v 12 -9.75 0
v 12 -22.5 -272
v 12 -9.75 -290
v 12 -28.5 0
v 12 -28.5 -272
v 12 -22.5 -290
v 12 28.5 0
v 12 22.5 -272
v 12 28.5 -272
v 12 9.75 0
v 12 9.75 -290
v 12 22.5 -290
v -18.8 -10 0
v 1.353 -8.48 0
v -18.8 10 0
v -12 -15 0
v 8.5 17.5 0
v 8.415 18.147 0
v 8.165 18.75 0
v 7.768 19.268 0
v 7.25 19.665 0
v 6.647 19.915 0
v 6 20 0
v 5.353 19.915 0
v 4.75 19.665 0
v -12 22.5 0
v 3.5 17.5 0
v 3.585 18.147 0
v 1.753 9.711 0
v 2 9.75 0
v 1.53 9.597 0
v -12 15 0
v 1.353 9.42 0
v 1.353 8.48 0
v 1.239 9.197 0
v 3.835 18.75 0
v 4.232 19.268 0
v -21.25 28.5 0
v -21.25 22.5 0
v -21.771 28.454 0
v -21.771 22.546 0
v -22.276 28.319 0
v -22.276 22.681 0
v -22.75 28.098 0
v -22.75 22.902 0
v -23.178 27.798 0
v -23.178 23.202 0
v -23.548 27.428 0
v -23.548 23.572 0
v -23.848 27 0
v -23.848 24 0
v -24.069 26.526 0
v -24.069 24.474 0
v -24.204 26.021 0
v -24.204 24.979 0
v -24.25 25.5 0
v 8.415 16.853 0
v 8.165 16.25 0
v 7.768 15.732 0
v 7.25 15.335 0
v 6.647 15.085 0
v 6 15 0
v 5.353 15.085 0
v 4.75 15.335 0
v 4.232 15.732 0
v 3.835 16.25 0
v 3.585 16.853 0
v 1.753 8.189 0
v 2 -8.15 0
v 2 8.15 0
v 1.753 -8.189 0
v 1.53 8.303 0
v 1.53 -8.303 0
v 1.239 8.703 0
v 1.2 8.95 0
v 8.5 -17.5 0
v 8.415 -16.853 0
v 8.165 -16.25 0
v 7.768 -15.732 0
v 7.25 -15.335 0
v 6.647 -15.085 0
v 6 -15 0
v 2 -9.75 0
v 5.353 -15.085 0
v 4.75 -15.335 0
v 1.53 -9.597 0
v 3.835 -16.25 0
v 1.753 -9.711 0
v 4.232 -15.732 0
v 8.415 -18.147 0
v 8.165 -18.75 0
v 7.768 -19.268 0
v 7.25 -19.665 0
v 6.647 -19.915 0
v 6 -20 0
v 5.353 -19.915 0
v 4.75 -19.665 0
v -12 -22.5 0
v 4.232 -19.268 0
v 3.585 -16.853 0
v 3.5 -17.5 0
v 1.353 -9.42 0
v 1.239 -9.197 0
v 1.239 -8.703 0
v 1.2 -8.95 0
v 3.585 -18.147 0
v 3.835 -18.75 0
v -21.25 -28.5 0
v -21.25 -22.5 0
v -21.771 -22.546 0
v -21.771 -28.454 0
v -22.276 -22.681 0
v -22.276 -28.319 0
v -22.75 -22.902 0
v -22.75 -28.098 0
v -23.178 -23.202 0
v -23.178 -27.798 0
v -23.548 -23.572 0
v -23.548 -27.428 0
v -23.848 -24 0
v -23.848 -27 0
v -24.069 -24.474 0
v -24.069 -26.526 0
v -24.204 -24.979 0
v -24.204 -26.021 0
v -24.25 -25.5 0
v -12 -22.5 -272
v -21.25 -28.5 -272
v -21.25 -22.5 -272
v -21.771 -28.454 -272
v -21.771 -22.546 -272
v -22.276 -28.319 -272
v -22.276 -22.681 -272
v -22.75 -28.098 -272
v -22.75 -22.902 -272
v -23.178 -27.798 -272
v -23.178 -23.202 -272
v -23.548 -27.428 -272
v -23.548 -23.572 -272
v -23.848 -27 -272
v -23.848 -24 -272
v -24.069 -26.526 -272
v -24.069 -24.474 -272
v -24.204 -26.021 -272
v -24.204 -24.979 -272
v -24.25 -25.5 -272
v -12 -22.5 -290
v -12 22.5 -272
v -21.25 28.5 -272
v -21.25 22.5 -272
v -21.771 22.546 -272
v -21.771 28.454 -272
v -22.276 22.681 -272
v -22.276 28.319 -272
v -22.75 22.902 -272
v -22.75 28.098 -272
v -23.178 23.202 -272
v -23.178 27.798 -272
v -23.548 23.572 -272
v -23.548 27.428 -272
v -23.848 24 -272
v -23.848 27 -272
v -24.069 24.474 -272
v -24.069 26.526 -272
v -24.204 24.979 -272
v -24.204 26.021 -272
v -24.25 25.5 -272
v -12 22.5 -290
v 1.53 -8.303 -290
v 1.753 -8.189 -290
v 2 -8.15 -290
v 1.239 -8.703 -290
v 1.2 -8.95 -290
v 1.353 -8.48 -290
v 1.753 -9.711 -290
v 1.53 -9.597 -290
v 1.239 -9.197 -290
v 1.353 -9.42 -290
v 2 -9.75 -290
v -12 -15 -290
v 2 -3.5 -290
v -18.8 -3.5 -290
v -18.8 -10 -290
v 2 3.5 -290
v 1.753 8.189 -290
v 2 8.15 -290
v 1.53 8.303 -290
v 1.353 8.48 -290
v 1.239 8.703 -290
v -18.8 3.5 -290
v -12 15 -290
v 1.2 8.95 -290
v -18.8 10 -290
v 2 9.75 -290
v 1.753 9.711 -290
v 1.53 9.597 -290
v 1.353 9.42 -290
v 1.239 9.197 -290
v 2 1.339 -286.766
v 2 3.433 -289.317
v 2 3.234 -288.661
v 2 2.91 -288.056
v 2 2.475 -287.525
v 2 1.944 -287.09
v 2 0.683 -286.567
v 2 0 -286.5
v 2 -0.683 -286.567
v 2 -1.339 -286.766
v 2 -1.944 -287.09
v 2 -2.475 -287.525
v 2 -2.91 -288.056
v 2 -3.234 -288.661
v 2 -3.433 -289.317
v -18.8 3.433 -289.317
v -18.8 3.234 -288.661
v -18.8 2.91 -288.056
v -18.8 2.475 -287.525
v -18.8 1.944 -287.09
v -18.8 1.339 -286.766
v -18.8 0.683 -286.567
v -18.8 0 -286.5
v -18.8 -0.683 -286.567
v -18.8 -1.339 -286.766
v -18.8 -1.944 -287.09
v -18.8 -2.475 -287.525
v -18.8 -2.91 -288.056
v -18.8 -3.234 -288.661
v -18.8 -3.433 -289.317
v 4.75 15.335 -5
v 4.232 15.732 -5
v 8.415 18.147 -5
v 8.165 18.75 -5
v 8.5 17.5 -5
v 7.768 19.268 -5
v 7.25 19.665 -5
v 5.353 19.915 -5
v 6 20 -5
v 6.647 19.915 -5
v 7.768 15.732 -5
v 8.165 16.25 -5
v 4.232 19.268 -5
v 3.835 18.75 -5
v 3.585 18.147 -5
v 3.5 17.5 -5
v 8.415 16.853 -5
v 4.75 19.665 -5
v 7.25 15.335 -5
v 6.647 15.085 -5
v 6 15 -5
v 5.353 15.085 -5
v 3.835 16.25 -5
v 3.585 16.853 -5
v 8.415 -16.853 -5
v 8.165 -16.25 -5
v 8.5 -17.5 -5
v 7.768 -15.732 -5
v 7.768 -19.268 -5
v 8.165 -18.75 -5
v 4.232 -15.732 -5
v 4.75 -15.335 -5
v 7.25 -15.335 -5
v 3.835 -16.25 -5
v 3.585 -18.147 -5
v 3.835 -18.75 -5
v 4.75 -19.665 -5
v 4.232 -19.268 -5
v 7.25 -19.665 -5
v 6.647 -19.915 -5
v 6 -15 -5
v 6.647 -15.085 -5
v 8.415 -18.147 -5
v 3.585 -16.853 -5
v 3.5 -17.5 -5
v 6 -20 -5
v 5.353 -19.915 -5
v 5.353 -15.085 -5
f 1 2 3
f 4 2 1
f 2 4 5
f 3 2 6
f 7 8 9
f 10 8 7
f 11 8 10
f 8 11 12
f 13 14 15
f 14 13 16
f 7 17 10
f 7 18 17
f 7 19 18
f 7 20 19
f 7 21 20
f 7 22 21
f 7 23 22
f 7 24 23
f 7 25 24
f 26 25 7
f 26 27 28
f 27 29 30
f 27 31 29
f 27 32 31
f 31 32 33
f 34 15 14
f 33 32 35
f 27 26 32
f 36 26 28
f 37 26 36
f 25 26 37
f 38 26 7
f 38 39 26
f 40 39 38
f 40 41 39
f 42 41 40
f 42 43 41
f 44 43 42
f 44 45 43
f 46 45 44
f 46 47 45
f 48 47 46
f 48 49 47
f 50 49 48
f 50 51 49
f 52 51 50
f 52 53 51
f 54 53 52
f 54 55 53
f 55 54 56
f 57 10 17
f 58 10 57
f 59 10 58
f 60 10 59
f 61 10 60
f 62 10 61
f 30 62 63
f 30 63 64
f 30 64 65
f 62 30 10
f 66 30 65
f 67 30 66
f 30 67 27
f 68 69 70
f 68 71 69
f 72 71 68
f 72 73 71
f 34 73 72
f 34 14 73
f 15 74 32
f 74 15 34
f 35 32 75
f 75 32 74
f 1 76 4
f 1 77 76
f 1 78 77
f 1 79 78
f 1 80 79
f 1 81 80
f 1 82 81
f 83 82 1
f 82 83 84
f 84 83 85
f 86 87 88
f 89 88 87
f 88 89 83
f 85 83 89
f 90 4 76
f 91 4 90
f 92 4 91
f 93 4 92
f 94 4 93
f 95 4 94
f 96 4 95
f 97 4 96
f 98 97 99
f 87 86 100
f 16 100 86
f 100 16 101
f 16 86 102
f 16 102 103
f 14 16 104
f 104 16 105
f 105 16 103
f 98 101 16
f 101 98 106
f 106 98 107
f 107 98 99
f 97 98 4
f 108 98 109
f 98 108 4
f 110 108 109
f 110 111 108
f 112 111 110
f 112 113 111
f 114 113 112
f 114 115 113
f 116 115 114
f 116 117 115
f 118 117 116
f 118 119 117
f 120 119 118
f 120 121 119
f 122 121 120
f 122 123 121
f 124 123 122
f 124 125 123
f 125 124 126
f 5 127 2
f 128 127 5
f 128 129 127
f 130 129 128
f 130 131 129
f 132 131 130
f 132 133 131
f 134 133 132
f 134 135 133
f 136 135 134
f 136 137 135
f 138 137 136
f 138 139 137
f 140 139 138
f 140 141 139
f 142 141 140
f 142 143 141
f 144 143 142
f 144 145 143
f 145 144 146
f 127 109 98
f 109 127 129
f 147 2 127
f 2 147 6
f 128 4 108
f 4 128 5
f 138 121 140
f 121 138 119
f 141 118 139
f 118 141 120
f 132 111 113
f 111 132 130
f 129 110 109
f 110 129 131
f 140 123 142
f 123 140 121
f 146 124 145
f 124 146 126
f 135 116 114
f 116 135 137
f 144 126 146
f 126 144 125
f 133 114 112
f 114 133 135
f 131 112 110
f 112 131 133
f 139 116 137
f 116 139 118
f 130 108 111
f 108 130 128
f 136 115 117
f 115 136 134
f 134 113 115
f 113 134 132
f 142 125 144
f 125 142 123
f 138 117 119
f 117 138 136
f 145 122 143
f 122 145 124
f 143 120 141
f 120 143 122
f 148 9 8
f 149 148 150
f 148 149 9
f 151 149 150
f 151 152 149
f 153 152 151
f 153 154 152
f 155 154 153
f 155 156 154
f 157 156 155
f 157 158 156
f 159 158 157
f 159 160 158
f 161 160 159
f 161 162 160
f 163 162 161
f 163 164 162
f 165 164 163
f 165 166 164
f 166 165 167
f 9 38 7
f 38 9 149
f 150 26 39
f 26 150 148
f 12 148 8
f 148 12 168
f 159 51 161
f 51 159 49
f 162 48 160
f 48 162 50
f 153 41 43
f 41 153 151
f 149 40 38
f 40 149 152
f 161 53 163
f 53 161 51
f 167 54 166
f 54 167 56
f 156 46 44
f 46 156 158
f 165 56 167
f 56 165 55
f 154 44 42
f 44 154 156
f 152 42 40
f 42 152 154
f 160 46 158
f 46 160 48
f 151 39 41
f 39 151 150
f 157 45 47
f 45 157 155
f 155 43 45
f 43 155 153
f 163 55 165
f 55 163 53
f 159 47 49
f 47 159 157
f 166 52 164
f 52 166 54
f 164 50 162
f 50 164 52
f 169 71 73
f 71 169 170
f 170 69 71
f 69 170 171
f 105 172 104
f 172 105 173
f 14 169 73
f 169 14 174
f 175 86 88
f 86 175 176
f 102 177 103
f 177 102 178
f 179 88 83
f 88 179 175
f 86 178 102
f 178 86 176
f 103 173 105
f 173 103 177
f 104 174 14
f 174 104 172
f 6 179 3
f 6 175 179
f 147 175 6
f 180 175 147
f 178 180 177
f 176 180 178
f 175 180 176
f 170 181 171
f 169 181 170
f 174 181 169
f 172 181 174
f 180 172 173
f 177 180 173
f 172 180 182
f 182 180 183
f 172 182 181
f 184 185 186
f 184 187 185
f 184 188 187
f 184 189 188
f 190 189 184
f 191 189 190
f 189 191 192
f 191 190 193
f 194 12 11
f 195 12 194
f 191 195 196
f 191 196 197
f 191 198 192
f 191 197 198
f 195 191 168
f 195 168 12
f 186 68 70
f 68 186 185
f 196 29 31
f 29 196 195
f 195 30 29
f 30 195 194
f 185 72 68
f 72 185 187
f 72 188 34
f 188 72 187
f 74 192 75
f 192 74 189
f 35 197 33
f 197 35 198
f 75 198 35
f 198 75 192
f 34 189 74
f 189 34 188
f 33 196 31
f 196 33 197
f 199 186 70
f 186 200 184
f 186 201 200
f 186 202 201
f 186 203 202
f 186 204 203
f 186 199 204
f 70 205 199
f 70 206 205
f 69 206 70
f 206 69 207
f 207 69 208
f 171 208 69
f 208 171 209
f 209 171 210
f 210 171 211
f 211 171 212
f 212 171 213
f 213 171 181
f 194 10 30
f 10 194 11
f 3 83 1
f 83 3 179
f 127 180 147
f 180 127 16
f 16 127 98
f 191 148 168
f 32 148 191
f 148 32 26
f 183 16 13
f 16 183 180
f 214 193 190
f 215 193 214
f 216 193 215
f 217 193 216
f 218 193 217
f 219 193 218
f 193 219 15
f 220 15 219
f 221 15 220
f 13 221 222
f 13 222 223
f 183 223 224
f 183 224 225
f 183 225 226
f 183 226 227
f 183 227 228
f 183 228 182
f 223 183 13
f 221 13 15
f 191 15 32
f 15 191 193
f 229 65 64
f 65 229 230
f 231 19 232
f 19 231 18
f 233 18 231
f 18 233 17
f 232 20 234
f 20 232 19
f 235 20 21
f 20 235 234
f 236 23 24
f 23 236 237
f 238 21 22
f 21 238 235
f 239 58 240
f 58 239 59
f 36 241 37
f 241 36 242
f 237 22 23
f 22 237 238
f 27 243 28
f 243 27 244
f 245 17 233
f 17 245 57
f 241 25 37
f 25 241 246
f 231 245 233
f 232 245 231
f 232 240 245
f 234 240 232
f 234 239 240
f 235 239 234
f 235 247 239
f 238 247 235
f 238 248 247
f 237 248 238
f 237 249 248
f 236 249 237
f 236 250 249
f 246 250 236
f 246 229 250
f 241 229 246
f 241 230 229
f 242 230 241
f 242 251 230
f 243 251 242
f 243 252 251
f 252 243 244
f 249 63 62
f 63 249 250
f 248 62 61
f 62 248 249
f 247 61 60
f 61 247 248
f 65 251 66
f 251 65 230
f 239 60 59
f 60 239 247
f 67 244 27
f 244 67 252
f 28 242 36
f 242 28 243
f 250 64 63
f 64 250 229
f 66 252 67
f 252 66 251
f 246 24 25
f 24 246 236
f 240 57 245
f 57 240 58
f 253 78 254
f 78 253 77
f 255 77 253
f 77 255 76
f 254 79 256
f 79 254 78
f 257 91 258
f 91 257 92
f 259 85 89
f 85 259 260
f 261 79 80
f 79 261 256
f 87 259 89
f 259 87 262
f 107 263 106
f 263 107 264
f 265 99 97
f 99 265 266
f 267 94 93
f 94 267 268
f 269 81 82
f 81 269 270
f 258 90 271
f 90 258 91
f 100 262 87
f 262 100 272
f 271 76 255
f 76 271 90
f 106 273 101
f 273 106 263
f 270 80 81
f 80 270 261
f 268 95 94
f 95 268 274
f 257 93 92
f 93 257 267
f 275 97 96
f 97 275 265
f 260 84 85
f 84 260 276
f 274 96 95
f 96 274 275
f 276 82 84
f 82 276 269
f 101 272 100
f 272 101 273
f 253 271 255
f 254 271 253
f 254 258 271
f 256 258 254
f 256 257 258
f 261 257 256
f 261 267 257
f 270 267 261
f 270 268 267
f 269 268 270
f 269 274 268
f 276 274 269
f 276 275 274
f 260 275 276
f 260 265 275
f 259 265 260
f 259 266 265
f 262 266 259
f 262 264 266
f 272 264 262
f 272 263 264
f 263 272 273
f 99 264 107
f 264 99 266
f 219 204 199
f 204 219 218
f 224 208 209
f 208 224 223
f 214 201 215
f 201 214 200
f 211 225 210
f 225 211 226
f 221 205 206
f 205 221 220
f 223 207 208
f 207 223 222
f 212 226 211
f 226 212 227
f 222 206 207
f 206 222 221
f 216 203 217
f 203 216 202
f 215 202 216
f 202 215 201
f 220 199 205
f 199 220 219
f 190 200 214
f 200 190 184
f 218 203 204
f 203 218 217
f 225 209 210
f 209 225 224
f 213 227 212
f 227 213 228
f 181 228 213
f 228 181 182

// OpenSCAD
// file: dimensions.scad
//      +---------------------+
//      |                     |
//      |                     |
//      |                     |
//      |                     |
//      |                     |
//      |                     |
//      |                     |
//      |                     |
//      |                     |
//      |                     |
//   ^  |                     |
//   |  |                     |
//   Y  |                     |
//   |  |                     |
//   |  |                     |
//      +---------------------+
//       --  X (depth) --> 
// 

// the depth of the main body
depth = 12;

// the depth of the latch plate
latch_plate_depth = 3.25;

// the width of the enclosure for the human door side
hd_enclosure_width = 45;

// the depth of the enclosure for the human door side
hd_enclosure_depth = 10 * 2.5 + latch_plate_depth - 6 + 2;

// the width of the indoor overhang
overhang_indoor_width = 6;

// the width of the outdoor overhang
overhang_outdoor_width = 6;

// the total height
total_height = 290;

// the width of the enclosure for the pet door side
pd_enclosure_width = 20 - 0.5;

// the depth of the enclosure for the pet door side
pd_enclosure_depth = 10;

seal_floor_offset = 12;
seal_small_width = 20;
seal_large_width = 30;
seal_depth = 6.8;

// the height of the track inset area
track_height = 18;

// the diameter of the track
track_diameter = 7;

// the height of the overhang
overhang_height = total_height - track_height;

// the total width
total_width = hd_enclosure_width + overhang_indoor_width + overhang_outdoor_width;

screw_body_clearance = 4.5;
screw_head_clearance = 9;
screw_body_depth = 10;
screw_angle_depth = 3;

// pins
pin_diameter = 5;
pin_length = 5;
// main file
include <dimensions.scad> 

module screw_slot() {
  $fn=32;
  
  cylinder(h=total_height+1, d=screw_body_clearance);
  cylinder(h=total_height - screw_body_depth - screw_angle_depth, d=screw_head_clearance);
  translate([0, 0, total_height - screw_body_depth - screw_angle_depth]) {
    cylinder(h=screw_angle_depth, d1=screw_head_clearance, d2=screw_body_clearance);
  }
}

// Z should be set to the surface that is being joined to
module joiner_pins_male() {
  translate([depth/2, (hd_enclosure_width/2) - pin_diameter, 0]) {
    cylinder(d=pin_diameter, h=pin_length, $fn=24);
  }
  translate([depth/2, -((hd_enclosure_width/2) - pin_diameter), 0]) {
    cylinder(d=pin_diameter, h=pin_length, $fn=24);
  }
}

module cylinder_outer(height,radius,fn){
  fudge = 1/cos(180/fn);
  cylinder(h=height,r=radius*fudge,$fn=fn);
}

module sphere_outer(r,fn){
  fudge = 1/cos(180/fn);
  sphere(r=r*fudge,$fn=fn);
}

module octahedron(r=10) {
    polyhedron(
        points=[
            [r,0,0], [-r,0,0], [0,r,0], [0,-r,0], // Equator
            [0,0,r], [0,0,-r]                      // Poles
        ],
        faces=[
            [0,2,4], [2,1,4], [1,3,4], [3,0,4],    // Top faces
            [0,3,5], [3,1,5], [1,2,5], [2,0,5]     // Bottom faces
        ]
    );
}

module joiner_pins_female() {
  module pin() {
    cylinder_outer(radius=pin_diameter/2, height=pin_length, fn=24);
    //translate([0, 0, 0/*pin_length*/]) {
      sphere(r=pin_diameter/2, $fn=8);
      //}
  }
  
  translate([depth/2, (hd_enclosure_width/2) - pin_diameter, -pin_length]) {
    pin();
  }
  translate([depth/2, -((hd_enclosure_width/2) - pin_diameter), -pin_length]) {
    pin();
  }
}

module main_body(ts=true, h=total_height) {

  // the radius of the little fold in the PD side
  pd_enclosure_mini_radius = 0.8;
  dfloor = (ts ? seal_floor_offset : 0);
    
  difference() {

    // the floor
    translate([-dfloor, -hd_enclosure_width/2, 0]) {
      cube([dfloor + depth,hd_enclosure_width, h]);
    }

    // the carveout for the pet door side
    translate([depth - pd_enclosure_depth, -pd_enclosure_width/2, 0]) {
      cube([pd_enclosure_depth, pd_enclosure_width, h]);
      rotate([0, 0, 90]) {
        translate([pd_enclosure_mini_radius, 0, 0]){
          cylinder(r=pd_enclosure_mini_radius, h=h, $fn=20);
        }
        translate([pd_enclosure_width - pd_enclosure_mini_radius, 0, 0]) {
          cylinder(r=pd_enclosure_mini_radius, h=h, $fn=20);
        }
      }
    }
  }

  if (ts) {
    translate([-dfloor, 0, 0])
    trapezoid_seal(h=h);
  }
}

// the trapezoidal seal
module trapezoid_seal(h=total_height) {
  x0 = -seal_depth;

  y0 = -seal_small_width / 2;
  y1 = seal_small_width / 2;
  y2 = -seal_large_width / 2;
  y3 = seal_large_width / 2;
  
  linear_extrude(height=h) {
    polygon(points=[[x0, y0], [x0, y1], [0, y3], [0, y2]]);
  }
}

module track_slot() {
  l = seal_depth + depth + seal_floor_offset;
  
  translate([-(seal_depth + seal_floor_offset), 0, 0]) {
    rotate(a=[0,90,0]) {
      # cylinder(h=l, d=track_diameter, $fn=32);
    }
  }
}

module seal(h=overhang_height, l=hd_enclosure_depth + depth) {
  ri = overhang_indoor_width / 2;
  ro = overhang_outdoor_width / 2;

  // the indoor overhang
  translate([ri,
             -hd_enclosure_width/2 - overhang_indoor_width,
             track_height]) {
    cube([l-ri,
          overhang_indoor_width,
          h]);
    translate([0, ri, overhang_height-h])
      cylinder(r=ri, h=h, $fn=36);
  }

  // the outdoor overhang
  translate([ro,
             hd_enclosure_width/2,
             track_height]) {
    cube([l-ro,
          overhang_outdoor_width,
          h]);
    translate([0, ro, overhang_height-h])
      cylinder(r=ro, h=h, $fn=36);
  }
}

module seal_overhang(l=hd_enclosure_depth + depth) {
  translate([-hd_enclosure_depth, 0, 0])
    seal(l=l);
}


screw_y_offset = total_width / 4 + 1;
screw_x_offset = screw_body_clearance + 2;

module screw_slots() {
  translate([screw_x_offset, screw_y_offset, 0])
    screw_slot();
  
  translate([screw_x_offset, -screw_y_offset, 0])
    screw_slot();
}

// some little dots to help grip the petdoor side
module grippies(l=total_length) {
  grippy_radius = 0.75;
  grippy_thick = 0.3;
  grippy_angle = 45;
  
  for (x=[10, l-10, l/2]) {
    translate([x, 0, 0]) {
      /*
      translate([0, pd_enclosure_width/2, pd_enclosure_depth/2 - depth]) {
        // # sphere(r=grippy_radius, $fn=8);
        rotate([0, 90, 0])
        rotate([0, 0, 180-grippy_angle])
          cube([grippy_thick, grippy_radius, 3]);
      }
      translate([0, -pd_enclosure_width/2, pd_enclosure_depth/2 - depth]) {
        rotate([0, 90, 0])
        rotate([0, 0, grippy_angle])
          cube([grippy_thick, grippy_radius, 3]);
        // sphere(r=grippy_radius, $fn=8);
      }
      */
      translate([0, -pd_enclosure_width/2, pd_enclosure_depth/2 - depth])
        rotate([grippy_angle, 0, 0])
        cylinder(r=grippy_radius, h=grippy_thick, $fn=20);
      translate([0, pd_enclosure_width/2, pd_enclosure_depth/2 - depth])
        rotate([90, 0, 0])
        rotate([grippy_angle, 0, 0])
        cylinder(r=grippy_radius, h=grippy_thick, $fn=20);
    }
  }
}

module bottom_bracket() {
  
  seal_overhang();

  // screw_slots();

  difference() {
    main_body();
    track_slot();

    translate([0, 0, total_height-pin_length]) {
      joiner_pins_male();
    }
  }
}

// rotate([0, 180, 0])
translate([0, 0, -total_height]) bottom_bracket();
